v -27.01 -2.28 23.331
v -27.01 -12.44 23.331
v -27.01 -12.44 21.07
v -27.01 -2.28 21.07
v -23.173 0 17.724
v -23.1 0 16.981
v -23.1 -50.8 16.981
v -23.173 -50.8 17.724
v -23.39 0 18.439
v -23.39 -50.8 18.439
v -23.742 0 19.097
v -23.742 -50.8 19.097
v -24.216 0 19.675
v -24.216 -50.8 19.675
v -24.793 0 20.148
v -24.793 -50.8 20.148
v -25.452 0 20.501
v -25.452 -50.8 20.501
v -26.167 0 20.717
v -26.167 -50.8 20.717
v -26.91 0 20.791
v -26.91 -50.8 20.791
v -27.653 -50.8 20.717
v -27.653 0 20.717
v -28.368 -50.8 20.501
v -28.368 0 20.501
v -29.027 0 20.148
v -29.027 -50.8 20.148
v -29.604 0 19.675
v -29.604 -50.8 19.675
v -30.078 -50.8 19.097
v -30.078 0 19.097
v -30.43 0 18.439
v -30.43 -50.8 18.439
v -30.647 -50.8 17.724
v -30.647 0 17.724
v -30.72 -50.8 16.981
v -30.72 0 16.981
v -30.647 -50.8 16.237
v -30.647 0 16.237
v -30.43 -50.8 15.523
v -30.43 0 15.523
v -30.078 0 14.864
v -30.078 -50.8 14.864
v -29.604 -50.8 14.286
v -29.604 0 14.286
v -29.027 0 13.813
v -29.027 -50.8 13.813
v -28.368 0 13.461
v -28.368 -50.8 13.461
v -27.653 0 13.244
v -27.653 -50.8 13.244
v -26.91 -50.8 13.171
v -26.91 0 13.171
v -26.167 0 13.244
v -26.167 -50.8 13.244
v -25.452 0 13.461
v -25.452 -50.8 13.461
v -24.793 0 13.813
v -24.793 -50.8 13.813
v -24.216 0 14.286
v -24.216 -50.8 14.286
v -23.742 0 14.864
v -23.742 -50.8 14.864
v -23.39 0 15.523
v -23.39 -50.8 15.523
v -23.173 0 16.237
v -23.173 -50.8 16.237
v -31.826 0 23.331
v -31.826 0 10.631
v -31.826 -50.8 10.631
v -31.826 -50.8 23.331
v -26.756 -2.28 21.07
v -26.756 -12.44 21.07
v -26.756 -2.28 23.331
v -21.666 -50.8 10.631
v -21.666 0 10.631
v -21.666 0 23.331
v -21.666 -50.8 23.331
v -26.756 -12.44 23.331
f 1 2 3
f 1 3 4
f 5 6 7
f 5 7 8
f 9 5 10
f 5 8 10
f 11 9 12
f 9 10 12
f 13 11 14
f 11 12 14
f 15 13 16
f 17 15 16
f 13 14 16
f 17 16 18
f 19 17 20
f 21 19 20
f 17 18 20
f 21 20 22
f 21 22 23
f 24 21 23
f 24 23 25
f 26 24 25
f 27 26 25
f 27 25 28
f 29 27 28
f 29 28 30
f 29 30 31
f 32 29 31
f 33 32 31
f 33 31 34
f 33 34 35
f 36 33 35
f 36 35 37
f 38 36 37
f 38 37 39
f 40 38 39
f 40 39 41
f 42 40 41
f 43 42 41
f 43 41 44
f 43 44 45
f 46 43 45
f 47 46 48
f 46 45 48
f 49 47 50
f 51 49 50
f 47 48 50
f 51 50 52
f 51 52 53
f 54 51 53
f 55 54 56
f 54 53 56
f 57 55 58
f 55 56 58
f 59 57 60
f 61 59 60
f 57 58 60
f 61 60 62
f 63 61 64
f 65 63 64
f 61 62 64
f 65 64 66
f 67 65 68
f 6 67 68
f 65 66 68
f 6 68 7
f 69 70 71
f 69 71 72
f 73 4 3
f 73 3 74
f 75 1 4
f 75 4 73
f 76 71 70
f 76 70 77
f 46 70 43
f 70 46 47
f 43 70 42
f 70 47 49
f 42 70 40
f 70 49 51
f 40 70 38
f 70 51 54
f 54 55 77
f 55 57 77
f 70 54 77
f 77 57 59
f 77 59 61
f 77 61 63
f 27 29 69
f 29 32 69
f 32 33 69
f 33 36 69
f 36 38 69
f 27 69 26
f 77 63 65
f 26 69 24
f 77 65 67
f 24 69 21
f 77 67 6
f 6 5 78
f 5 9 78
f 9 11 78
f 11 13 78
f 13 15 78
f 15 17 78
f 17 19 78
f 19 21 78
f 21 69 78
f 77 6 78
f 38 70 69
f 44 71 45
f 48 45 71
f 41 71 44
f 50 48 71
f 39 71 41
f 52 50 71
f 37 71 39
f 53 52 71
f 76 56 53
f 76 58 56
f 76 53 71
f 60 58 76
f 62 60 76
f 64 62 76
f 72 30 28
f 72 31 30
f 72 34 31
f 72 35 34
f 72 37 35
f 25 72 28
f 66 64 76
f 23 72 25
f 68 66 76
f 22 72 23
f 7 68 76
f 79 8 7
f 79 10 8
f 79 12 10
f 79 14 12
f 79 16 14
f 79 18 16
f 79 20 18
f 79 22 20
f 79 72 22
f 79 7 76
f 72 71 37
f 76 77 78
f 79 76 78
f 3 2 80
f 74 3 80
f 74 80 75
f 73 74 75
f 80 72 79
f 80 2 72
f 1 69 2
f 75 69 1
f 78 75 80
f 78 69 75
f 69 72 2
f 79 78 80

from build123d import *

# Parameters (mm, degrees)
F0_W     = 10.16
F0_H     = 12.7
F1_DEPTH = 50.8
F2_R     = 3.81
F3_DEPTH = 76.2
F4_W     = 0.254
F4_H     = 10.16
F5_DEPTH = 2.2606


with BuildPart() as f1:
    # F0 (on Front) → F1 (new body)
    with BuildSketch(Plane.XZ):
        with Locations((-26.745969, 16.98054)):
            Rectangle(F0_W, F0_H)
    extrude(amount=F1_DEPTH)

    # F2 (on face) → F3 (cut)
    with BuildSketch(Plane.XZ.offset(50.8)):
        with Locations((-26.909839, 16.98054)):
            Circle(F2_R)
    extrude(amount=-F3_DEPTH, mode=Mode.SUBTRACT)

    # F4 (on face) → F5 (cut)
    with BuildSketch(Plane.XY.offset(23.33054)):
        with Locations((-26.883121, -7.359638)):
            Rectangle(F4_W, F4_H)
    extrude(amount=-F5_DEPTH, mode=Mode.SUBTRACT)


solid = f1.part
